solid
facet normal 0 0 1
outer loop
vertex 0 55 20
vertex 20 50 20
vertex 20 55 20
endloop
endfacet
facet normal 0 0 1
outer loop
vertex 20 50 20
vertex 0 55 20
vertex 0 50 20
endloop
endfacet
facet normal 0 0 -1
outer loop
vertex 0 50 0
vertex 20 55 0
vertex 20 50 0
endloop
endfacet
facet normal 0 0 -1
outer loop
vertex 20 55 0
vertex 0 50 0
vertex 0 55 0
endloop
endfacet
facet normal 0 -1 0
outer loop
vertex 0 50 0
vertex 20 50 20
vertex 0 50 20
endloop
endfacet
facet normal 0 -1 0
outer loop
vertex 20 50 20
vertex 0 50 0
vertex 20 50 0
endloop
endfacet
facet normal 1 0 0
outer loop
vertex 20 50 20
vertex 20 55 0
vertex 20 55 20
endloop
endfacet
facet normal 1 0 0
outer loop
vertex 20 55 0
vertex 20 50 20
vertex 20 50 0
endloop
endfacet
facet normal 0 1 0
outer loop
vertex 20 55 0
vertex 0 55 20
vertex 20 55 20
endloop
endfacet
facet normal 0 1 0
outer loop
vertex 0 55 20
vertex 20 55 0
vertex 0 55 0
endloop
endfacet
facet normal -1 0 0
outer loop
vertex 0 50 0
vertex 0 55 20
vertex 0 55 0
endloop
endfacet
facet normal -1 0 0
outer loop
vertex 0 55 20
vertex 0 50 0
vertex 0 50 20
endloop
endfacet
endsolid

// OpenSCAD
// Failure class 6: Z-up vs Y-up confusion
// The model is designed in Y-up convention (Blender) but OpenSCAD uses
// Z-up. The vertical movement is applied in Y instead of Z, producing
// a model that is flat or incorrectly oriented.
translate([0, 50, 0])
cube([20, 5, 20]);
